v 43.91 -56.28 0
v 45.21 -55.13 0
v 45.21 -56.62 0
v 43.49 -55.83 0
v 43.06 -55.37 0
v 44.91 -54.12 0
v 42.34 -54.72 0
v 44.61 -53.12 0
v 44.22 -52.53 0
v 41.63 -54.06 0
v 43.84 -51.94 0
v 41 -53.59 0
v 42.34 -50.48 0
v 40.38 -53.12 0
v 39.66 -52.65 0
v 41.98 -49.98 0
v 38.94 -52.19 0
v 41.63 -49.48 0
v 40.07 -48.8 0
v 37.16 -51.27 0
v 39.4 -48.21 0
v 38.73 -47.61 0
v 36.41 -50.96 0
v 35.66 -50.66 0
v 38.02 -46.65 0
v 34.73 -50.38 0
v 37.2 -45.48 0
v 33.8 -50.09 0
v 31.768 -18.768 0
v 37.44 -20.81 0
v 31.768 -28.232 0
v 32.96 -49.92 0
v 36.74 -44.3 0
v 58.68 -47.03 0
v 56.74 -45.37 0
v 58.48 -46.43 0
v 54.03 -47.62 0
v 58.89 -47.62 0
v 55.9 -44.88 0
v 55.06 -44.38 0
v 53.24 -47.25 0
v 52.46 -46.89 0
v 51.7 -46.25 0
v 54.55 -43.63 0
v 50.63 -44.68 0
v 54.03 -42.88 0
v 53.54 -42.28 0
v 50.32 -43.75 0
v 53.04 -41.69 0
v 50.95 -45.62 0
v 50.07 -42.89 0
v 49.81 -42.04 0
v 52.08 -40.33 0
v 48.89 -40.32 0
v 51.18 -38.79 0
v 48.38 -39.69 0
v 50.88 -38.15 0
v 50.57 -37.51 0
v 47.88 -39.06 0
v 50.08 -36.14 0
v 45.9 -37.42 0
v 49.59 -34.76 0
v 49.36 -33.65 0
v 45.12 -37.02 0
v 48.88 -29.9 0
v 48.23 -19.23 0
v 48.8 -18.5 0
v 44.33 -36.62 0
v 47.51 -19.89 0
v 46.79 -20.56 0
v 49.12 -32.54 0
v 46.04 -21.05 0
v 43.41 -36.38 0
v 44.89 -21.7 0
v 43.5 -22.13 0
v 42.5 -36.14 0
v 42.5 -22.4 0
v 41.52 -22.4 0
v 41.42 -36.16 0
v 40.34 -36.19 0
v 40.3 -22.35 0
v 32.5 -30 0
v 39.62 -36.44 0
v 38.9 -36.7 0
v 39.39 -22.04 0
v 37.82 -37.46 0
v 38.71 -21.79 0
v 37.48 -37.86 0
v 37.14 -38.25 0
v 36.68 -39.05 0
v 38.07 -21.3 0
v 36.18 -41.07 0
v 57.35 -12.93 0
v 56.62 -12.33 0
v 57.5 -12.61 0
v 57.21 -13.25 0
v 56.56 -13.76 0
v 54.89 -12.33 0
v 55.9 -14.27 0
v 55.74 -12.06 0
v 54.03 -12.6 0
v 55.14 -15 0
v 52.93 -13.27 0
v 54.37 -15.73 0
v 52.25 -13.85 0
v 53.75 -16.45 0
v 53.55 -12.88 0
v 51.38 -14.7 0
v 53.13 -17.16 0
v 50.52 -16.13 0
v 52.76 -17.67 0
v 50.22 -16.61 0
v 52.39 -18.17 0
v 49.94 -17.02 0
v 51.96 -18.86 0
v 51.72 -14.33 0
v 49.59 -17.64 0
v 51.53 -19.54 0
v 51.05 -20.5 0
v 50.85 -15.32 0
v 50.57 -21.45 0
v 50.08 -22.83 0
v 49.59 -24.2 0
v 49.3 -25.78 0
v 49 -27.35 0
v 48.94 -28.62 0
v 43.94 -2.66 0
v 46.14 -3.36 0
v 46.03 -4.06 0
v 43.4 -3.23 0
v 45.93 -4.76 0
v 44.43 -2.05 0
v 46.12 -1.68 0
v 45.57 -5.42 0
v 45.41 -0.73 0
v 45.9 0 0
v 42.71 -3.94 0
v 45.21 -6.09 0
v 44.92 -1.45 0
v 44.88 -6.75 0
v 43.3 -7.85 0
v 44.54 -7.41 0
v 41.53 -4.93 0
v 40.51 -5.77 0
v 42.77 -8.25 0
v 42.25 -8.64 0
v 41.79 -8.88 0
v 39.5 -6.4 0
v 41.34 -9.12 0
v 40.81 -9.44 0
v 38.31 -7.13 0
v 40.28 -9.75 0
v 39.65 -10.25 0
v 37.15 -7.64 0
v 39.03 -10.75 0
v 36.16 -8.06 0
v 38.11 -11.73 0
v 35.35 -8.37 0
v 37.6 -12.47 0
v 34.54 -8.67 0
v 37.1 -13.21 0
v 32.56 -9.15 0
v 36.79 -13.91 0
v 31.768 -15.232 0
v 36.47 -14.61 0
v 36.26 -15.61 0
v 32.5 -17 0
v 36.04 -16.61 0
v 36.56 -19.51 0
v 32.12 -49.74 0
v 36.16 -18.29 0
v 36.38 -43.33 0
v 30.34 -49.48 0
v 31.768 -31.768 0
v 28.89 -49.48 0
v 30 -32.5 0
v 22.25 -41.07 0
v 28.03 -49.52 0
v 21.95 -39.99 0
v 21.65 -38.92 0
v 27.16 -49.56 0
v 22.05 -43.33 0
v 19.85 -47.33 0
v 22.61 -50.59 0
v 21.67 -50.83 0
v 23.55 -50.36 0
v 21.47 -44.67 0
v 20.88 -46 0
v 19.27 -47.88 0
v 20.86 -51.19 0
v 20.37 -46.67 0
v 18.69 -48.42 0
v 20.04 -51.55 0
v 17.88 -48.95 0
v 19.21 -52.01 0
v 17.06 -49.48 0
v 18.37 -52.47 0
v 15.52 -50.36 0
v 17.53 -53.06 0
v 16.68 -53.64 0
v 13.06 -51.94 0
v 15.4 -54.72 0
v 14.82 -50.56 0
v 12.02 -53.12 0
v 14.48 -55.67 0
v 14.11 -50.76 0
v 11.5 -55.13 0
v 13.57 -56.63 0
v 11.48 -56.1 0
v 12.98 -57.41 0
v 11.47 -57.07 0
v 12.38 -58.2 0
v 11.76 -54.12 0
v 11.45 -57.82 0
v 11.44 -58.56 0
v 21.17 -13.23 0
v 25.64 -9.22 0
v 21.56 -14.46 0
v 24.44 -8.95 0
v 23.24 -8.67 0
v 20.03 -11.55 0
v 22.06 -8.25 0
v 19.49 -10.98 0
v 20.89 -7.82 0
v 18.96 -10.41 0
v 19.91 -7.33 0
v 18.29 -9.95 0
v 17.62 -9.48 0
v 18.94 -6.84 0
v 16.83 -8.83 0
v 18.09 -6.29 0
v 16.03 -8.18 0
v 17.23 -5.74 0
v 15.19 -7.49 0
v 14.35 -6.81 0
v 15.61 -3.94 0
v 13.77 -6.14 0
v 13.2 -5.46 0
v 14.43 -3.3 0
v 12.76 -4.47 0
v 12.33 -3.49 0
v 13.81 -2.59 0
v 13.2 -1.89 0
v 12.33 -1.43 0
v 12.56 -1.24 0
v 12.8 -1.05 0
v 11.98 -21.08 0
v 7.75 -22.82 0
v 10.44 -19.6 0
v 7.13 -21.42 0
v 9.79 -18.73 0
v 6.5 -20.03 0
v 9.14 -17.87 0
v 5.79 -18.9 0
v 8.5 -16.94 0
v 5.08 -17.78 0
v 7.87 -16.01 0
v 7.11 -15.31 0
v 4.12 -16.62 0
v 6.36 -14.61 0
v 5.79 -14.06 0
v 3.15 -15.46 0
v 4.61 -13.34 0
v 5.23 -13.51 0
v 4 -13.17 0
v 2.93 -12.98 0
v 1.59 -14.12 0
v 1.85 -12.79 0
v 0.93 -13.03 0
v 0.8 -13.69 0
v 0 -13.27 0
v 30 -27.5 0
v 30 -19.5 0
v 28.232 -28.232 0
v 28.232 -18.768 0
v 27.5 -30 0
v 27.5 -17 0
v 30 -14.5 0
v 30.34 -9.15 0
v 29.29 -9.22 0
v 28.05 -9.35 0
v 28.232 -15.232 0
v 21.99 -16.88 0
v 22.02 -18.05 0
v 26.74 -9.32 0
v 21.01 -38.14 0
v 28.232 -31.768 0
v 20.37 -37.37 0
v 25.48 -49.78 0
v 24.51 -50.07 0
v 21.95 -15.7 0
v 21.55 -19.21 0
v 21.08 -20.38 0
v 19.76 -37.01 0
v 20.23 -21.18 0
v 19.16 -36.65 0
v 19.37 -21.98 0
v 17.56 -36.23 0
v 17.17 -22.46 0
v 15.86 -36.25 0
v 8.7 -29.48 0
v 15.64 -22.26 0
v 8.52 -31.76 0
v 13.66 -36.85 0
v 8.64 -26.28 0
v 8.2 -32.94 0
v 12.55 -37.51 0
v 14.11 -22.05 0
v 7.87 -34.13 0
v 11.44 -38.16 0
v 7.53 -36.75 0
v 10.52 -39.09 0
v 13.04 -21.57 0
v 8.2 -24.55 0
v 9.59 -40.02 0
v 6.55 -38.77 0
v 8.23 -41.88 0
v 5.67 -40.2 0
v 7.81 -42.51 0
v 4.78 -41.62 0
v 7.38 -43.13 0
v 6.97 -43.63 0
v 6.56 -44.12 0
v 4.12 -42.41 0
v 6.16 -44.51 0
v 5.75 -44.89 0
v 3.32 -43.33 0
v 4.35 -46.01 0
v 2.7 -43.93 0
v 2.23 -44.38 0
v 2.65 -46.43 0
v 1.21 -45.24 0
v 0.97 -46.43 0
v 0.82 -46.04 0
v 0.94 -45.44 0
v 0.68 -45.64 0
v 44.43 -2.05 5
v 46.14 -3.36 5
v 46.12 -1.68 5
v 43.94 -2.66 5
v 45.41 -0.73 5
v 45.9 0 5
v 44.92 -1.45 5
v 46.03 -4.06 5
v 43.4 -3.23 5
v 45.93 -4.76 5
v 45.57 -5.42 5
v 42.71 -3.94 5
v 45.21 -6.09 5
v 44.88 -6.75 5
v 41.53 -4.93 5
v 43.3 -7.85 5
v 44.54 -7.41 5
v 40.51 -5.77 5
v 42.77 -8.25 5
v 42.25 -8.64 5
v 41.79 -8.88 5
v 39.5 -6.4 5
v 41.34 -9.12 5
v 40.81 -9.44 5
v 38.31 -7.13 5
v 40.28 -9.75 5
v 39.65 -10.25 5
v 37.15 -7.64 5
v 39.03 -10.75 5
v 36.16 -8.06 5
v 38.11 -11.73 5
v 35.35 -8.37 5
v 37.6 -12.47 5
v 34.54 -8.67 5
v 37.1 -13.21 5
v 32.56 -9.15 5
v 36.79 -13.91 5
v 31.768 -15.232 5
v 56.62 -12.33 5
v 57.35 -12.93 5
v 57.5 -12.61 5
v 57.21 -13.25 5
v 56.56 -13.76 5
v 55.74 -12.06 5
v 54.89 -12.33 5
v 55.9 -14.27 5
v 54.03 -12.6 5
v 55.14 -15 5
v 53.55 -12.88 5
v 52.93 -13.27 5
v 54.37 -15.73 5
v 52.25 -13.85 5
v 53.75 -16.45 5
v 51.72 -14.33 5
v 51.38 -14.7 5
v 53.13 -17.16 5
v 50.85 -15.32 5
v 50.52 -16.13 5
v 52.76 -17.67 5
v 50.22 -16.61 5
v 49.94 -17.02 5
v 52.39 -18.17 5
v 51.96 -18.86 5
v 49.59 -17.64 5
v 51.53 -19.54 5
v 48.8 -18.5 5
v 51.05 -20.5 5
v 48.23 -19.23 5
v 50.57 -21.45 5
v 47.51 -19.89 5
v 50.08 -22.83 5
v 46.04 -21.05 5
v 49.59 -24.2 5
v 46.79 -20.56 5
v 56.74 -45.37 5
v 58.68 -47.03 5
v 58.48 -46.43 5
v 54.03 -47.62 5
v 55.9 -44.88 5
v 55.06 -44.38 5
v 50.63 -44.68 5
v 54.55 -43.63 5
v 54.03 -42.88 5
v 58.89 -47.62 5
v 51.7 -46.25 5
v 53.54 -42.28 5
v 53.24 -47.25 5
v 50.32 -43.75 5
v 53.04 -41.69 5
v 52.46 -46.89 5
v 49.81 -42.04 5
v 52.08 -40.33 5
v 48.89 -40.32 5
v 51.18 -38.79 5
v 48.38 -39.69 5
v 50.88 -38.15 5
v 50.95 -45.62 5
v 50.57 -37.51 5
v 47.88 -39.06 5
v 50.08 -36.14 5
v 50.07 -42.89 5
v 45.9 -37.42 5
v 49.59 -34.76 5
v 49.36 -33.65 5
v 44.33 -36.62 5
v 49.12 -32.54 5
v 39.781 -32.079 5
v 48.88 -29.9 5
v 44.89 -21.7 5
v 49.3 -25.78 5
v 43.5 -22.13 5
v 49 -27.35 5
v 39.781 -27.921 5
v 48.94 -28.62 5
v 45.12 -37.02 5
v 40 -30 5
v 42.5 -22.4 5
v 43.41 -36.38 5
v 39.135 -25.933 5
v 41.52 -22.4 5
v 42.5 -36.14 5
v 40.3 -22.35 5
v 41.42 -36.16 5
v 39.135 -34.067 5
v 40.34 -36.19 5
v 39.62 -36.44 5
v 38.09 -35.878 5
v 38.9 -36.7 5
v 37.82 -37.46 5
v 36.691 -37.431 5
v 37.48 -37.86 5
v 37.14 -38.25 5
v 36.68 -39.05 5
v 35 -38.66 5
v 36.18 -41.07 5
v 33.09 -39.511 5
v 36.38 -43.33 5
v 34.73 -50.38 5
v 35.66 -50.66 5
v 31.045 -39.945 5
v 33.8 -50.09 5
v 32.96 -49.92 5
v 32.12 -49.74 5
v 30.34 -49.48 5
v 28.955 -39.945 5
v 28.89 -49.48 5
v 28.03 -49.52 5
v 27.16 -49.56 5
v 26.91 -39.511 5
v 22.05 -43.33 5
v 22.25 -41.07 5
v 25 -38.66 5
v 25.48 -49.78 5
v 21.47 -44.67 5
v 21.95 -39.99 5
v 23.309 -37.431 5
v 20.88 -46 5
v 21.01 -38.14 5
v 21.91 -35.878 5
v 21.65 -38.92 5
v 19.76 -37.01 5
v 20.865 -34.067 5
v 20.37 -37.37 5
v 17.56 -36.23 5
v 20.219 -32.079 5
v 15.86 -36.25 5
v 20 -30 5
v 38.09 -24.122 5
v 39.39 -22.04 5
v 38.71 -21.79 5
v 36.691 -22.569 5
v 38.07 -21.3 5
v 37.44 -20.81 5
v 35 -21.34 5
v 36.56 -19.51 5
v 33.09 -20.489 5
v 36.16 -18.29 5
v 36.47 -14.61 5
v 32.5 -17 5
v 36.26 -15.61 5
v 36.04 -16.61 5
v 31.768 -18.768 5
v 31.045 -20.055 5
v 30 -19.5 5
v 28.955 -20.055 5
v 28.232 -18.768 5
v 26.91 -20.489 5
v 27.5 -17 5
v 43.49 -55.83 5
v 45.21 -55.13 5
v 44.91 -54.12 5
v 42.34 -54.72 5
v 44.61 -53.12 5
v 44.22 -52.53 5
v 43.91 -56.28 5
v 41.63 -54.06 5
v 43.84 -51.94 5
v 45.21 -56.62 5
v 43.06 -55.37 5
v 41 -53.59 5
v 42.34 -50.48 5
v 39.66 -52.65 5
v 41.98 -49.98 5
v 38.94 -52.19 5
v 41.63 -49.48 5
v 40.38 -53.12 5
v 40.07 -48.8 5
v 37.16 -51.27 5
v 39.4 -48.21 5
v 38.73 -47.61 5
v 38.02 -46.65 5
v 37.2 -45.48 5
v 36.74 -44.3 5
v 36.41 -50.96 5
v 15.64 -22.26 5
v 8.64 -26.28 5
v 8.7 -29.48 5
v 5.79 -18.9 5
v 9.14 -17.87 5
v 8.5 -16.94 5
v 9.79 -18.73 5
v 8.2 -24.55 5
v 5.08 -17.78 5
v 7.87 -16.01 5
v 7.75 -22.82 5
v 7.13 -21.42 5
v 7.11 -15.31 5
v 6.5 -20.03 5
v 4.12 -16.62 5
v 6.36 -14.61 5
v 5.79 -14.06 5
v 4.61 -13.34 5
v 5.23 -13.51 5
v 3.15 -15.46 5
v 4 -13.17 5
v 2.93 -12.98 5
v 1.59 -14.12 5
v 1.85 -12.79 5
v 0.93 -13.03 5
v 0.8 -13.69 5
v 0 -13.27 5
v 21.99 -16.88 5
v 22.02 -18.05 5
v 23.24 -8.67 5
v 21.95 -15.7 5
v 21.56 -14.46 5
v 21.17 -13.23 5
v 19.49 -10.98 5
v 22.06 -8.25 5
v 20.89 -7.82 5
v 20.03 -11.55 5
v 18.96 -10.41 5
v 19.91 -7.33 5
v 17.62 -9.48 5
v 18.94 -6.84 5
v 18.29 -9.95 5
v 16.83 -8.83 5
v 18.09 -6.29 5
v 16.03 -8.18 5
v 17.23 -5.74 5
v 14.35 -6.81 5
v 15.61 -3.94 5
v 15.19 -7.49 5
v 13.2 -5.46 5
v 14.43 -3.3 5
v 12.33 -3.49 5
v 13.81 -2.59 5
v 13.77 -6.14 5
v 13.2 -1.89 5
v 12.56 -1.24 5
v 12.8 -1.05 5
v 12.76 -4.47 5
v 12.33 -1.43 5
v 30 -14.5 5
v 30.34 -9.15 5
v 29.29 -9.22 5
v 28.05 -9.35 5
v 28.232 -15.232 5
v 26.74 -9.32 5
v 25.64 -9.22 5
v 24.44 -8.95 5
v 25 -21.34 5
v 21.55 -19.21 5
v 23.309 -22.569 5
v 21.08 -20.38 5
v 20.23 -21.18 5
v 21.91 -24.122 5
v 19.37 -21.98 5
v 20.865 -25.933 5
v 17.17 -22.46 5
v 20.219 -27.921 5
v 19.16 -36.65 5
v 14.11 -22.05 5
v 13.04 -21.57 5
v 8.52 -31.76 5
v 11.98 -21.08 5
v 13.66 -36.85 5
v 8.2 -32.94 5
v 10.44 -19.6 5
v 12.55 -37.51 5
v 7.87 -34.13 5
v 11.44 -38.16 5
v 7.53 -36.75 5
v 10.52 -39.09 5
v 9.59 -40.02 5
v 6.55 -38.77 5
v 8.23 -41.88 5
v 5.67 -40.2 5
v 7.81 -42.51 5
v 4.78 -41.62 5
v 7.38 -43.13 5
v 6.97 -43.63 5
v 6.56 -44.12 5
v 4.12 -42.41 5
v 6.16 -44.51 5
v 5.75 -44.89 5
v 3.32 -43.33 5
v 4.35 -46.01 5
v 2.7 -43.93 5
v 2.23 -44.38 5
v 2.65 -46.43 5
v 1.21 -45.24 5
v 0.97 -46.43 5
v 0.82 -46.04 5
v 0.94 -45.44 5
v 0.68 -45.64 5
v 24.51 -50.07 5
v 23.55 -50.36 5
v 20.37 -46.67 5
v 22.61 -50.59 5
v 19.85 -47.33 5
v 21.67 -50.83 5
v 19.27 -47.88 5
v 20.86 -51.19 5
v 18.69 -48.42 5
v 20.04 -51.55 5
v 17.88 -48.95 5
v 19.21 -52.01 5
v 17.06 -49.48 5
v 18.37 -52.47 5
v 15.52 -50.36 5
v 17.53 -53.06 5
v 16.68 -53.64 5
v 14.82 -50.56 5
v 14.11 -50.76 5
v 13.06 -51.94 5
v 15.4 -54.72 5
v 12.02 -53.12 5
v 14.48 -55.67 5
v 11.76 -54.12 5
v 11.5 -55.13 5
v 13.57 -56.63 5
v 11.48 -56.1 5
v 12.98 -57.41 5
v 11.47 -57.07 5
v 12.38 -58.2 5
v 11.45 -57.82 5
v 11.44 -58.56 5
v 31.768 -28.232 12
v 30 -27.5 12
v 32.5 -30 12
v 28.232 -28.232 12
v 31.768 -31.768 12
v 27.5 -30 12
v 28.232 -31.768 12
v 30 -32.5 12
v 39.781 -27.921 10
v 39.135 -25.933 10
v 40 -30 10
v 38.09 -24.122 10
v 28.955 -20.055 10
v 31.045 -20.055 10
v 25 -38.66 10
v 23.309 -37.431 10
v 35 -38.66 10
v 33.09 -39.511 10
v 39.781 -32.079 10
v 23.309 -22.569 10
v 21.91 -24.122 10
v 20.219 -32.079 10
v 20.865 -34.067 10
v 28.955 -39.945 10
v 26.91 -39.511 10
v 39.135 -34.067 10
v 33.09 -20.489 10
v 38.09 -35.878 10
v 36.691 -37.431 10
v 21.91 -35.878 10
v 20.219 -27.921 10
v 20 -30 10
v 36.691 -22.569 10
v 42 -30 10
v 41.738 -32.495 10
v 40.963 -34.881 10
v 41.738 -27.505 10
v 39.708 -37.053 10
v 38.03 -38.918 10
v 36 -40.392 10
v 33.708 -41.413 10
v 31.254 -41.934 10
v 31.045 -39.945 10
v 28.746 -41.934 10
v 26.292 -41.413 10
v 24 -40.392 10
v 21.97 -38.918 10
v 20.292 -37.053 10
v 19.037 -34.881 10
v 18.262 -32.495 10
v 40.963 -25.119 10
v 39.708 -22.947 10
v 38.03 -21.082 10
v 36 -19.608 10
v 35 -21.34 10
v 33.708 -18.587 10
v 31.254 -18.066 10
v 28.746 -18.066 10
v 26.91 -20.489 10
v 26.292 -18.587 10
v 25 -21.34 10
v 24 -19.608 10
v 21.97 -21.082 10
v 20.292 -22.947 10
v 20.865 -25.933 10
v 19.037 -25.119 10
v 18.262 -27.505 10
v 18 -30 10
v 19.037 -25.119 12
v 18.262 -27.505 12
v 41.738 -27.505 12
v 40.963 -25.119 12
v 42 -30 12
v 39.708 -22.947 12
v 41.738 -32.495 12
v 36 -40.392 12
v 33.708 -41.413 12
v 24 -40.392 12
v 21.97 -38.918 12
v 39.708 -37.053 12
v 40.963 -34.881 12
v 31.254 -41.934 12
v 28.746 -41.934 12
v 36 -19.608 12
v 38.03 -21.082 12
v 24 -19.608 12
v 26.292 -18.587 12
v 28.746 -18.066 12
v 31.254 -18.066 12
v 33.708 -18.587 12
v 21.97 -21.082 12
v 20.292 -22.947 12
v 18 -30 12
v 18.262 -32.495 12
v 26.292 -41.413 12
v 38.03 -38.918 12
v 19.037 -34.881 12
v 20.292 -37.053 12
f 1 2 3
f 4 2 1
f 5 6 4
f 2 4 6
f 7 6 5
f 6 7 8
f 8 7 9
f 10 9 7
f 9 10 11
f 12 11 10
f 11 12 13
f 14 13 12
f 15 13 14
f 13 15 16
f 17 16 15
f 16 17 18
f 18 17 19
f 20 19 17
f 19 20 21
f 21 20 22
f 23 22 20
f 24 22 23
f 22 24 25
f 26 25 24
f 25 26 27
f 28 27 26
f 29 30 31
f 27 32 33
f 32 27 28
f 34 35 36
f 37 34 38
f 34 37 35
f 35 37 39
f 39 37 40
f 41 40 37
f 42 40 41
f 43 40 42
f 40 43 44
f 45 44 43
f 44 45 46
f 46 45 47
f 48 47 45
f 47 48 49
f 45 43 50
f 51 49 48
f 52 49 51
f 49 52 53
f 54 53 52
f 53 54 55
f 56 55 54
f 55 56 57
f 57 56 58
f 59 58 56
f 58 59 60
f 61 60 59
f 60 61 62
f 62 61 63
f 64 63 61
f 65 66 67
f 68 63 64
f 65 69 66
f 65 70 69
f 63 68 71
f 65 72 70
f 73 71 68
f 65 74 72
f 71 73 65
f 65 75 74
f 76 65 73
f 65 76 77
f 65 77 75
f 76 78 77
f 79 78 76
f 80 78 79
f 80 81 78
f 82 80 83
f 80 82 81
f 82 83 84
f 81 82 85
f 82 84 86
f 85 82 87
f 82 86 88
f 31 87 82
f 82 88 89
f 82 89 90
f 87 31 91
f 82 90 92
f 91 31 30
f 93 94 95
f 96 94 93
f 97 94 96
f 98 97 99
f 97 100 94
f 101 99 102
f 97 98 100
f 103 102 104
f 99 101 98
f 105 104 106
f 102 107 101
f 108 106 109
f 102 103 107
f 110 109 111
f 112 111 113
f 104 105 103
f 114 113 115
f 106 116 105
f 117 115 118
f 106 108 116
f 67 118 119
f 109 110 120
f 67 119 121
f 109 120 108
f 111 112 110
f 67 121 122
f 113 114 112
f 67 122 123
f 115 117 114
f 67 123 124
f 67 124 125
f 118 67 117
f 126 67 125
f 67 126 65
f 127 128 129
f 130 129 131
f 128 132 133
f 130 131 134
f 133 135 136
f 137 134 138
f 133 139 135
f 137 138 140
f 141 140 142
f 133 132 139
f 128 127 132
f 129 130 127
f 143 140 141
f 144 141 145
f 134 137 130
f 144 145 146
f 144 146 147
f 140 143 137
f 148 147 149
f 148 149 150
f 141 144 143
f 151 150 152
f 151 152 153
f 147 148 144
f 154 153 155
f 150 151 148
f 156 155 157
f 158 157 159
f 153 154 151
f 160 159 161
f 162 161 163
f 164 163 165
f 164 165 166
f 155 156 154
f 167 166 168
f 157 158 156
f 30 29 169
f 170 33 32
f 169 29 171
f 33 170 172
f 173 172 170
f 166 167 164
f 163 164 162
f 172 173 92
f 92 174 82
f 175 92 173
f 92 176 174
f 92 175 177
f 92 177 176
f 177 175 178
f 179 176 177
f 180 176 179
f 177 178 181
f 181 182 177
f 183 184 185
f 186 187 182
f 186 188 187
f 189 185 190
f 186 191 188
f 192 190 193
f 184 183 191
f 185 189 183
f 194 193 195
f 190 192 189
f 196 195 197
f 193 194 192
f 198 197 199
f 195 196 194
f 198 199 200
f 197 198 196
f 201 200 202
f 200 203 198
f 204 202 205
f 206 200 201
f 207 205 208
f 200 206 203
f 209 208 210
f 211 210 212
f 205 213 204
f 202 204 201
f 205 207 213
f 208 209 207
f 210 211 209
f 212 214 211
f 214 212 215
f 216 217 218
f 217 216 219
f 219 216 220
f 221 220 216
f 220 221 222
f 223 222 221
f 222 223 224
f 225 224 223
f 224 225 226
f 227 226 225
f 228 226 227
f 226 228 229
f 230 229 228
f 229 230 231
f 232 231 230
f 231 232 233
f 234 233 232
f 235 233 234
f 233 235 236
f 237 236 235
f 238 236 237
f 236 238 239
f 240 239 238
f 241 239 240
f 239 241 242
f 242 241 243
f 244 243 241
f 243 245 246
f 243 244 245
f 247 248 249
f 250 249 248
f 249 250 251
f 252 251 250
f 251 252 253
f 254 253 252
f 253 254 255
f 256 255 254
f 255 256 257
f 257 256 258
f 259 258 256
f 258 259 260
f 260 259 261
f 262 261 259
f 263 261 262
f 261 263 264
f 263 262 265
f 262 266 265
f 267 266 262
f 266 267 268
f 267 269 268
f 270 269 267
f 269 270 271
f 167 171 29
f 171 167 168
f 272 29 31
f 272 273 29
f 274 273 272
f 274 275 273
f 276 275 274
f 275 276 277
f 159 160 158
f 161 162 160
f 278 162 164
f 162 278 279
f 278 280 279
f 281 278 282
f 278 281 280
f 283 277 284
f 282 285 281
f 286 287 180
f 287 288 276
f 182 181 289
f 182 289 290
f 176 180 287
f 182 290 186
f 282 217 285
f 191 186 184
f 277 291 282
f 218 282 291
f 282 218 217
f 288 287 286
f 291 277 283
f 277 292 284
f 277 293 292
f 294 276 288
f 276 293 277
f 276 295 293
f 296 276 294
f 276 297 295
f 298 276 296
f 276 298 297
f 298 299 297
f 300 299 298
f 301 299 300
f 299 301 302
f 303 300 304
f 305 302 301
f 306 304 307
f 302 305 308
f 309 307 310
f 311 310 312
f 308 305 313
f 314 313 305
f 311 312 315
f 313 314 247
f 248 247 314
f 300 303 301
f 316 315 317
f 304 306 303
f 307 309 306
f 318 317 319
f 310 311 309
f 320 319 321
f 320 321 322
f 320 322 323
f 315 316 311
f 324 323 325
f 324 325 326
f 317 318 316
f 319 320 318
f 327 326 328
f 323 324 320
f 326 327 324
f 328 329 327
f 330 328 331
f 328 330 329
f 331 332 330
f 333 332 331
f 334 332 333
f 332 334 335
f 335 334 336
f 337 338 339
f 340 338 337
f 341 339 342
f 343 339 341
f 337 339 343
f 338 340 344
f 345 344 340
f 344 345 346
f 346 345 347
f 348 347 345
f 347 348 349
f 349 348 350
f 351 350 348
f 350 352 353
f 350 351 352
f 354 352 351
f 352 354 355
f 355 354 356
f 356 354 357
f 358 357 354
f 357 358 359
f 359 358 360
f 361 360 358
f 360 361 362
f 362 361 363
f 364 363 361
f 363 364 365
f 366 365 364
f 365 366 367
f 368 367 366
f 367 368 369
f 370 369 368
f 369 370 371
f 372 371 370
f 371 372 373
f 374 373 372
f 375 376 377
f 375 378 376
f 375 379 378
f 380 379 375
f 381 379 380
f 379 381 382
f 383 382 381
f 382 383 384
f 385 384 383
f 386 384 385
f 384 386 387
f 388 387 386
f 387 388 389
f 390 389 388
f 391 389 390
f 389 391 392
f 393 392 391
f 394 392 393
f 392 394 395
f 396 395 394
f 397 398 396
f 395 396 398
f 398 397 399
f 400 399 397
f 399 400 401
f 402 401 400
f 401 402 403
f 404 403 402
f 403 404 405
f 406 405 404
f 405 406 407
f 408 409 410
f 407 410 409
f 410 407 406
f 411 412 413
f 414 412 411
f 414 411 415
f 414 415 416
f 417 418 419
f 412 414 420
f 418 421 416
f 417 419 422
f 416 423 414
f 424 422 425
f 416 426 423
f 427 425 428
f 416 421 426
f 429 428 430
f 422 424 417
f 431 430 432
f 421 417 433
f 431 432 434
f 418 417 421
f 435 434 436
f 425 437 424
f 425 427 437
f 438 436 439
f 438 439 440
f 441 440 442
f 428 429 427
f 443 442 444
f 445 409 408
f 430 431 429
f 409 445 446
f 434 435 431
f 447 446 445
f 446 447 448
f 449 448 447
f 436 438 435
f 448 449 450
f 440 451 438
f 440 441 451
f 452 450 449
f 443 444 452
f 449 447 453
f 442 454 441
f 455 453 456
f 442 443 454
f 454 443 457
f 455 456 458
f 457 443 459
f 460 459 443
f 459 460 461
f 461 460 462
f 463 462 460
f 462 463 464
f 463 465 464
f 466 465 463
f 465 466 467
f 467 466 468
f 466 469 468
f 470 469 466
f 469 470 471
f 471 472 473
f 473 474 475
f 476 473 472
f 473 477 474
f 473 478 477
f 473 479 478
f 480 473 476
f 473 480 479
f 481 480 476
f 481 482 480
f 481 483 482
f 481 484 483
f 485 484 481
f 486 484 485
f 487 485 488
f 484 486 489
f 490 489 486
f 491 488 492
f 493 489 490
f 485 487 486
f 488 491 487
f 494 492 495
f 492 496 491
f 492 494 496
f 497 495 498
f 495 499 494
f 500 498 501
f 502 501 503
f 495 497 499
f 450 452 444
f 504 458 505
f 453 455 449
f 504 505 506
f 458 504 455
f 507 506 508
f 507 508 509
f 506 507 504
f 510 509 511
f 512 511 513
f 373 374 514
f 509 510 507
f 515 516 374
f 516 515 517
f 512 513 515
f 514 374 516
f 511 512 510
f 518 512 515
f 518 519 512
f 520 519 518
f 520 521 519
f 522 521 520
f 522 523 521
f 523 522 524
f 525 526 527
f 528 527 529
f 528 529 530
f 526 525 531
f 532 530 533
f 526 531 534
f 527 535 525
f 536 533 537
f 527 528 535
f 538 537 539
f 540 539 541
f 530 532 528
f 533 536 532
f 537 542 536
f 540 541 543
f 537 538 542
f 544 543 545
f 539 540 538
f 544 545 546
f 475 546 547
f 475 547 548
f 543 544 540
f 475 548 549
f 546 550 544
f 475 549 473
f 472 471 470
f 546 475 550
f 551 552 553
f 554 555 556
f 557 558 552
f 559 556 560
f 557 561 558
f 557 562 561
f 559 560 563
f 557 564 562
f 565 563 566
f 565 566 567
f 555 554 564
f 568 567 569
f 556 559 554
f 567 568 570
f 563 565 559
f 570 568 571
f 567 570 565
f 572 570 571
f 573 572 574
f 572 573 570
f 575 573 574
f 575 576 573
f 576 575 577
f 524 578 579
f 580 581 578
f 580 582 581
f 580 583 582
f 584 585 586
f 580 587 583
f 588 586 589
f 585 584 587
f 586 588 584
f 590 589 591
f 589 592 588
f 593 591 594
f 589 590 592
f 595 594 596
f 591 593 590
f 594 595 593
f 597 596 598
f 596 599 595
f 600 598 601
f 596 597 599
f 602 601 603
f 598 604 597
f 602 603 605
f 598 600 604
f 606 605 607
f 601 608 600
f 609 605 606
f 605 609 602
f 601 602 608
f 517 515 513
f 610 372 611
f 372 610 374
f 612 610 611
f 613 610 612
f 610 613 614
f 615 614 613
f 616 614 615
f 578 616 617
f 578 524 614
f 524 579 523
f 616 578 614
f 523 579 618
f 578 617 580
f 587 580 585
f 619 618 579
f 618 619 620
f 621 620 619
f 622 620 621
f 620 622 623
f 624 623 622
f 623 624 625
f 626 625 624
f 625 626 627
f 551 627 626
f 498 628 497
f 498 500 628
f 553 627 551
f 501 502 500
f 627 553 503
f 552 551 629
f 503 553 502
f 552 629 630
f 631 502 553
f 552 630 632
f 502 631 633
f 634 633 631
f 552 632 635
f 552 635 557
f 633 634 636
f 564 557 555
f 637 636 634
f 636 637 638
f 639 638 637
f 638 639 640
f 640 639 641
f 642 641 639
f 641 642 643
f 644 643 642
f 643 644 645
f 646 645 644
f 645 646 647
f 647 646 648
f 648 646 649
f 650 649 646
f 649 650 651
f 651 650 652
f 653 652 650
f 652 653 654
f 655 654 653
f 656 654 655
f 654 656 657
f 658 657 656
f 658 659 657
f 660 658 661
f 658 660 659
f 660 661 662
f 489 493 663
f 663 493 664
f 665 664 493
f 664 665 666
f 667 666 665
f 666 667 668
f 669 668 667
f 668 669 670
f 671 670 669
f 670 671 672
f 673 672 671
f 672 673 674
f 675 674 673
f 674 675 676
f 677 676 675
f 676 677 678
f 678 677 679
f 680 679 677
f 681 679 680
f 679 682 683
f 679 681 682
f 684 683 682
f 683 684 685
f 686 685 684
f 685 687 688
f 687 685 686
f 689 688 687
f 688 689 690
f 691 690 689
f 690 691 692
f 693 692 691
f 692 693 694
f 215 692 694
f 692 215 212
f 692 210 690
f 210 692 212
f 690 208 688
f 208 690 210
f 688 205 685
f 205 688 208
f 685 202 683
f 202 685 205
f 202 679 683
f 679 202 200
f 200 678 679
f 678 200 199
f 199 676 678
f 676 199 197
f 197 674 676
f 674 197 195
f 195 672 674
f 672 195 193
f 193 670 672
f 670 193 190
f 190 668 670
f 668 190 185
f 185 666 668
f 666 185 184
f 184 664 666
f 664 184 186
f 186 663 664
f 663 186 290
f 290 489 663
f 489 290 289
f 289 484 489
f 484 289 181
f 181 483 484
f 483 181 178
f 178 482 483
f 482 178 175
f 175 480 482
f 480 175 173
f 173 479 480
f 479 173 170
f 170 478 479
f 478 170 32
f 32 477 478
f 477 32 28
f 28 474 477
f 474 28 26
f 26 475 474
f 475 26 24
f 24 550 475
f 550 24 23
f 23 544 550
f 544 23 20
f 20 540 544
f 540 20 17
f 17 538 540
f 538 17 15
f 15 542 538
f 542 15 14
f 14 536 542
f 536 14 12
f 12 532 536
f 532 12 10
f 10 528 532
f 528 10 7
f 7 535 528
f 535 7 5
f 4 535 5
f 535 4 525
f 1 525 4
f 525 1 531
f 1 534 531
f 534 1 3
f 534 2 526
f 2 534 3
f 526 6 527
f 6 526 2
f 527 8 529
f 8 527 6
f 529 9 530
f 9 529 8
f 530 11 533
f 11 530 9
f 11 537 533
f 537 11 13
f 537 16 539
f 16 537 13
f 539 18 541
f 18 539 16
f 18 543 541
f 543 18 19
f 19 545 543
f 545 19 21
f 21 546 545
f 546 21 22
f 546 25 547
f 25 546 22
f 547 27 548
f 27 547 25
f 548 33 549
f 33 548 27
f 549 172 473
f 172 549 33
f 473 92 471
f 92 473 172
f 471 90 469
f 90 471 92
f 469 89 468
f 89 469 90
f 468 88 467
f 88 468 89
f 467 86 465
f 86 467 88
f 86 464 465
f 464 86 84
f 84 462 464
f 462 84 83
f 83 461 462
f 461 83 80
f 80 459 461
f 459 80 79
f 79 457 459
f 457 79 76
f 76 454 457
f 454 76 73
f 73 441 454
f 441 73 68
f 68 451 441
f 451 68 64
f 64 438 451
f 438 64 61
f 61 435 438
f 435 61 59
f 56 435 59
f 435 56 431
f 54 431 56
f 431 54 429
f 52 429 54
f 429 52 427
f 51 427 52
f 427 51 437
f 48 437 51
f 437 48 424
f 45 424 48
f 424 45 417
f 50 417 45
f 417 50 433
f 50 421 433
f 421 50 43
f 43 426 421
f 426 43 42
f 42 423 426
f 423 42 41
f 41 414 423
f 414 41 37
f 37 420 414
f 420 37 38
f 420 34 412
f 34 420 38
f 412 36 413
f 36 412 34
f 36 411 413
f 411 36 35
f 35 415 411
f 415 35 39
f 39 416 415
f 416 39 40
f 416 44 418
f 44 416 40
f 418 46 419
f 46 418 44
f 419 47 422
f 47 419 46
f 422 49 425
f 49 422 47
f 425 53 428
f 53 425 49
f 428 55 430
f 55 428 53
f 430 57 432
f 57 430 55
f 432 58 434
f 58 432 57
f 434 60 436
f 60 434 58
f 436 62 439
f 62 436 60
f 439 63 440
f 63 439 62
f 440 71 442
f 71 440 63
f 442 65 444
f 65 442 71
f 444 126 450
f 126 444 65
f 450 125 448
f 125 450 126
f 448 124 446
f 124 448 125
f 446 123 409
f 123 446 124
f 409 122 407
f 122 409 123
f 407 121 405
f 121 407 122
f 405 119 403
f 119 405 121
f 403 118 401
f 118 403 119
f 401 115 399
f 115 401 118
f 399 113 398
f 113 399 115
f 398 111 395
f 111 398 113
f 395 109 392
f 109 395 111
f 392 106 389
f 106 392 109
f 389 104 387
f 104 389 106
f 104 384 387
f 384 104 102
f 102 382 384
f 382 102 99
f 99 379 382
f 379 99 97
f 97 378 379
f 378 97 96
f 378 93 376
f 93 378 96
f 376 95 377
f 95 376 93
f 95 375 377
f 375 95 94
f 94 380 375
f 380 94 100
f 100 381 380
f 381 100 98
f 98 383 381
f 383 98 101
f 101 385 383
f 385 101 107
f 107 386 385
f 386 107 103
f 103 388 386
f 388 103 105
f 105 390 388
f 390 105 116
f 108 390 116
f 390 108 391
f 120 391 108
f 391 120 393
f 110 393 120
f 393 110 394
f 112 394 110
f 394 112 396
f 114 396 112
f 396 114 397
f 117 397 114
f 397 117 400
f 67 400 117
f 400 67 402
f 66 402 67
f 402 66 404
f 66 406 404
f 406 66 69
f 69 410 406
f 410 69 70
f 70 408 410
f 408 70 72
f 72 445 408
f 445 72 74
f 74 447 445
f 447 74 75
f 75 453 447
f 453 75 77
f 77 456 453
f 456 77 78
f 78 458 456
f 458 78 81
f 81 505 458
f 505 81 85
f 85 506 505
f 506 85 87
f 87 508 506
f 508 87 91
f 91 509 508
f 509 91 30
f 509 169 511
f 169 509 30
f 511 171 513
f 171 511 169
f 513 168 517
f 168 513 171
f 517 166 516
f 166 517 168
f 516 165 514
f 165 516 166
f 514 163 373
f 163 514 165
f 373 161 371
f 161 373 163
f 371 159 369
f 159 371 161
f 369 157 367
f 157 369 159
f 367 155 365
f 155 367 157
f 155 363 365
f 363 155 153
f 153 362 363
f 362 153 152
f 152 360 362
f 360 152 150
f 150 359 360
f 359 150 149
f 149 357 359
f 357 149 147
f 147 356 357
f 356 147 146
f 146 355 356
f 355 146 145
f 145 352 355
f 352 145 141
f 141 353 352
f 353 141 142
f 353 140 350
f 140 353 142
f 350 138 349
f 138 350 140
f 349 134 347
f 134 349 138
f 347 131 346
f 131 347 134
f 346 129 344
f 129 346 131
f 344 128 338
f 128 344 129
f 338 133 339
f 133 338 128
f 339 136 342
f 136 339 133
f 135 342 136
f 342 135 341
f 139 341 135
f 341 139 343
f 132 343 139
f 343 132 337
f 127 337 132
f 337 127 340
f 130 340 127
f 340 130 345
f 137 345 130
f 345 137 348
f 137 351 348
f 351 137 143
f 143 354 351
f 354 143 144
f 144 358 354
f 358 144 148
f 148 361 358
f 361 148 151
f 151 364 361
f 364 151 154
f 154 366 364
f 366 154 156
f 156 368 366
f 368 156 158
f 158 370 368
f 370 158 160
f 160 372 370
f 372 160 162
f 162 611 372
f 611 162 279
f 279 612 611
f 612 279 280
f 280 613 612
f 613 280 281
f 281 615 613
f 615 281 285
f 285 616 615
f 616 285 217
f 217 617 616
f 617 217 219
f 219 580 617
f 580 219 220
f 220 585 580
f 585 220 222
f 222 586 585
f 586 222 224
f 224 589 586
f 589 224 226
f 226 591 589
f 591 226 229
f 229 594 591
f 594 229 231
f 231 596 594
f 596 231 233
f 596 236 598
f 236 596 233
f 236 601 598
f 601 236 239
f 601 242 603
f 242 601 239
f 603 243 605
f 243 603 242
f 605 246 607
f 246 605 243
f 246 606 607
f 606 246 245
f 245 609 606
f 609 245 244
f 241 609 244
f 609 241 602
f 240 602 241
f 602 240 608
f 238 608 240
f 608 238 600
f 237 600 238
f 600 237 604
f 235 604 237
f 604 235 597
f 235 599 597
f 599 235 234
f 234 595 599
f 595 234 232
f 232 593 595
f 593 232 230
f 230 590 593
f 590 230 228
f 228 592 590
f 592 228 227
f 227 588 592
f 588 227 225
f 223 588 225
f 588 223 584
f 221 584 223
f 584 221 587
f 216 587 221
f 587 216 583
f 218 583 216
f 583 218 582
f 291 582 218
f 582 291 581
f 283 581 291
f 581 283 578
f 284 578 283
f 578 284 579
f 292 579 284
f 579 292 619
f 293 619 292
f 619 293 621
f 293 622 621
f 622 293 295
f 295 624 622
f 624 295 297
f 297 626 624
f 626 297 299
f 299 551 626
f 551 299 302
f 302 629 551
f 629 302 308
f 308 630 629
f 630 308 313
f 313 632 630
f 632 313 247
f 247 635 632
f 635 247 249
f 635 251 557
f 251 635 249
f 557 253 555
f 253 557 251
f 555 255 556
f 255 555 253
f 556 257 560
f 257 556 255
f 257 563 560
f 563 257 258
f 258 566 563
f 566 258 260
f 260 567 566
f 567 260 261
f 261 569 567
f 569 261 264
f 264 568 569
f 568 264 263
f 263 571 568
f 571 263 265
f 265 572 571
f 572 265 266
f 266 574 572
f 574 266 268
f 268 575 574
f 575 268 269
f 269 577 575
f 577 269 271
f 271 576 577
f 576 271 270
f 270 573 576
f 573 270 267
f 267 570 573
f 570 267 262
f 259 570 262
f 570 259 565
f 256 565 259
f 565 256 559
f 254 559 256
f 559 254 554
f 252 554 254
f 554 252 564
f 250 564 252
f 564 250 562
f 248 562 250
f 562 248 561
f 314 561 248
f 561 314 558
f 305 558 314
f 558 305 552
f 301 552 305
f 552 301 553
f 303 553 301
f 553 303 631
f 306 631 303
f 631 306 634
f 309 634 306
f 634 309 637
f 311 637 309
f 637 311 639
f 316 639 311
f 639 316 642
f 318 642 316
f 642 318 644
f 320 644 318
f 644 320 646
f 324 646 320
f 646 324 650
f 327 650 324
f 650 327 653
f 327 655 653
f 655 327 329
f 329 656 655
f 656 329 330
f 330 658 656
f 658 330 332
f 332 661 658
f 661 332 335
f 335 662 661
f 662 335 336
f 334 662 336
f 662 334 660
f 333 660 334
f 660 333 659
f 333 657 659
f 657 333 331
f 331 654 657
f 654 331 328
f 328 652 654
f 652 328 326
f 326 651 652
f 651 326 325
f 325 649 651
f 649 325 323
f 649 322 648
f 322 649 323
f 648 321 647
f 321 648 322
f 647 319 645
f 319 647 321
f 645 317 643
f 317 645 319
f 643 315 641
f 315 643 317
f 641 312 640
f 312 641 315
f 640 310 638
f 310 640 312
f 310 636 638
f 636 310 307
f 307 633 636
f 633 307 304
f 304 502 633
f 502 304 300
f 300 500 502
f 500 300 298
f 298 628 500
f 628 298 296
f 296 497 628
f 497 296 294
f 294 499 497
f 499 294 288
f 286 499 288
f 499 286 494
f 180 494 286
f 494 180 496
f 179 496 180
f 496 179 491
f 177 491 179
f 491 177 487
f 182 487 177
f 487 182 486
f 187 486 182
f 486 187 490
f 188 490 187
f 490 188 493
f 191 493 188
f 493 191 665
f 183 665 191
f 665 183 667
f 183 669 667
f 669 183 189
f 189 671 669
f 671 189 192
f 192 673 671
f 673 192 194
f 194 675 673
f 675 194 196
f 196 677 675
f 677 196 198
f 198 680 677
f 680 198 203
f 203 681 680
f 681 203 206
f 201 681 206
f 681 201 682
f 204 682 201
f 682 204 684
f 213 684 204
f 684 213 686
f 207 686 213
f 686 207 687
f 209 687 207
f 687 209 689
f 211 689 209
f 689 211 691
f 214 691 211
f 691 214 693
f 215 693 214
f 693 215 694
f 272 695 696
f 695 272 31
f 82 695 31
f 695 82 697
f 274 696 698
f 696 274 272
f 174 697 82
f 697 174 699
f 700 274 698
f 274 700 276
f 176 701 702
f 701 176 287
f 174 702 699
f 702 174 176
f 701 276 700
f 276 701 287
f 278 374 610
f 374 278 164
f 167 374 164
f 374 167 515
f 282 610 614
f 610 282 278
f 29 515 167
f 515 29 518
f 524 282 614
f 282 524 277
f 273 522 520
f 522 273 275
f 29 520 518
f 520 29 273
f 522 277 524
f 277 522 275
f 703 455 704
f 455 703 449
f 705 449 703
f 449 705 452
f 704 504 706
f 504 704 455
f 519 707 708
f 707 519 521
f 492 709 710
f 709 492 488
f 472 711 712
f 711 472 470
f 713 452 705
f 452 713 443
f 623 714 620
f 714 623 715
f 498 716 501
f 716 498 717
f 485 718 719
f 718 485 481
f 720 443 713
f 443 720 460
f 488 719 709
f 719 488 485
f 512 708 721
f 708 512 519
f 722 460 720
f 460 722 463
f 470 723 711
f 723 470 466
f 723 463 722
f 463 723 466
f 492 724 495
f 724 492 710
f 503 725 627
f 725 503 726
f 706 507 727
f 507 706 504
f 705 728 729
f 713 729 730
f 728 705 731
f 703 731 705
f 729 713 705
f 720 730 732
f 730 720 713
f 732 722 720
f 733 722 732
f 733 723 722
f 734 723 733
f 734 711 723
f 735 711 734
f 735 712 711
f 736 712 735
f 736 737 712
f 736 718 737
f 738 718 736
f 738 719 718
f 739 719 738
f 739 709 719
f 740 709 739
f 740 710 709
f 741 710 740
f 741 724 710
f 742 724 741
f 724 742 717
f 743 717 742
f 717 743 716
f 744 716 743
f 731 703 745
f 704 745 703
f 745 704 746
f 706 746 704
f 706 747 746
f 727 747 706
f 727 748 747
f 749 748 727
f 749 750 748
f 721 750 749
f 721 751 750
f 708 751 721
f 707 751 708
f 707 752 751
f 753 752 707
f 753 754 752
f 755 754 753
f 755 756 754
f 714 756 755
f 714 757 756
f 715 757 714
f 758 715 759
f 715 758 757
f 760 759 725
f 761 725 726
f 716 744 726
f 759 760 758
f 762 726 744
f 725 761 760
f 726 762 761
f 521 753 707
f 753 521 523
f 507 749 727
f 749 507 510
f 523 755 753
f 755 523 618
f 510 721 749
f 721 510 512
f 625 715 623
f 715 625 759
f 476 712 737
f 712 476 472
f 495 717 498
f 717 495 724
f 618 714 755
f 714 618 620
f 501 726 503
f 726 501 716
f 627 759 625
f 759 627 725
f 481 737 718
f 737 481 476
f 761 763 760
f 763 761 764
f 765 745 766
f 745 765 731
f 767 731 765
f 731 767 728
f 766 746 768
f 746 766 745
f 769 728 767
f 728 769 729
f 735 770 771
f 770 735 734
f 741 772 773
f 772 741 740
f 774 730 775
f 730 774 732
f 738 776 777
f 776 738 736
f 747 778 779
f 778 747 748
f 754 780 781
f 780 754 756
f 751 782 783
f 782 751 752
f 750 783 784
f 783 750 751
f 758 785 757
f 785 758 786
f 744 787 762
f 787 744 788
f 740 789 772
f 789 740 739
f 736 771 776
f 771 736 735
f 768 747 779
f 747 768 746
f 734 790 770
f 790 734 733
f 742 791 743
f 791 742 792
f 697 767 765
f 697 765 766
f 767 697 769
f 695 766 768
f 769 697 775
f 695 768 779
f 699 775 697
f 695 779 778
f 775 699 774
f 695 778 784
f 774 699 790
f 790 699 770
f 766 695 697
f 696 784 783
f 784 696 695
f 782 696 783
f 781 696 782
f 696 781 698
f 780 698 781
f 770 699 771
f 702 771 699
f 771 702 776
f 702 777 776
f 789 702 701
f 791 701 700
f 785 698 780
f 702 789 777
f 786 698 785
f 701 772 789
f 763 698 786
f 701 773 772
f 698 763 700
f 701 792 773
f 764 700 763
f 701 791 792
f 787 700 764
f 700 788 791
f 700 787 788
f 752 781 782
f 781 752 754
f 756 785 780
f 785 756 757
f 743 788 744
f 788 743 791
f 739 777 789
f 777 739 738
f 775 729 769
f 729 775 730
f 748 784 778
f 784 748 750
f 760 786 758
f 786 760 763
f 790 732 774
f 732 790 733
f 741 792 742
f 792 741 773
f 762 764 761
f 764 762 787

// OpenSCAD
difference(){

linear_extrude(height = 5, center = false) {

polygon(points=[[45.9,0],[45.41,-0.73],[44.92,-1.45],[44.43,-2.05],[43.94,-2.66],[43.4,-3.23],[42.71,-3.94],[41.53,-4.93],[40.51,-5.77],[39.5,-6.4],[38.31,-7.13],[37.15,-7.64],[36.16,-8.06],[35.35,-8.37],[34.54,-8.67],[33.55,-8.91],[32.56,-9.15],[31.45,-9.15],[30.34,-9.15],[29.29,-9.22],[28.05,-9.35],[26.74,-9.32],[25.64,-9.22],[24.44,-8.95],[23.24,-8.67],[22.06,-8.25],[20.89,-7.82],[19.91,-7.33],[18.94,-6.84],[18.09,-6.29],[17.23,-5.74],[16.42,-4.84],[15.61,-3.94],[15.02,-3.62],[14.43,-3.3],[13.81,-2.59],[13.2,-1.89],[13,-1.47],[12.8,-1.05],[12.56,-1.24],[12.33,-1.43],[12.33,-2.46],[12.33,-3.49],[12.76,-4.47],[13.2,-5.46],[13.77,-6.14],[14.35,-6.81],[15.19,-7.49],[16.03,-8.18],[16.83,-8.83],[17.62,-9.48],[18.29,-9.95],[18.96,-10.41],[19.49,-10.98],[20.03,-11.55],[20.6,-12.39],[21.17,-13.23],[21.56,-14.46],[21.95,-15.7],[21.99,-16.88],[22.02,-18.05],[21.55,-19.21],[21.08,-20.38],[20.23,-21.18],[19.37,-21.98],[18.27,-22.22],[17.17,-22.46],[15.64,-22.26],[14.11,-22.05],[13.04,-21.57],[11.98,-21.08],[11.21,-20.34],[10.44,-19.6],[9.79,-18.73],[9.14,-17.87],[8.5,-16.94],[7.87,-16.01],[7.11,-15.31],[6.36,-14.61],[5.79,-14.06],[5.23,-13.51],[4.61,-13.34],[4,-13.17],[2.93,-12.98],[1.85,-12.79],[0.93,-13.03],[0,-13.27],[0.8,-13.69],[1.59,-14.12],[2.37,-14.79],[3.15,-15.46],[4.12,-16.62],[5.08,-17.78],[5.79,-18.9],[6.5,-20.03],[7.13,-21.42],[7.75,-22.82],[8.2,-24.55],[8.64,-26.28],[8.67,-27.88],[8.7,-29.48],[8.61,-30.62],[8.52,-31.76],[8.2,-32.94],[7.87,-34.13],[7.7,-35.44],[7.53,-36.75],[7.04,-37.76],[6.55,-38.77],[5.67,-40.2],[4.78,-41.62],[4.12,-42.41],[3.32,-43.33],[2.7,-43.93],[2.23,-44.38],[1.72,-44.81],[1.21,-45.24],[0.94,-45.44],[0.68,-45.64],[0.82,-46.04],[0.97,-46.43],[1.81,-46.43],[2.65,-46.43],[3.5,-46.22],[4.35,-46.01],[5.05,-45.45],[5.75,-44.89],[6.16,-44.51],[6.56,-44.12],[6.97,-43.63],[7.38,-43.13],[7.81,-42.51],[8.23,-41.88],[8.91,-40.95],[9.59,-40.02],[10.52,-39.09],[11.44,-38.16],[12.55,-37.51],[13.66,-36.85],[14.76,-36.55],[15.86,-36.25],[16.71,-36.24],[17.56,-36.23],[18.36,-36.44],[19.16,-36.65],[19.76,-37.01],[20.37,-37.37],[21.01,-38.14],[21.65,-38.92],[21.95,-39.99],[22.25,-41.07],[22.15,-42.2],[22.05,-43.33],[21.47,-44.67],[20.88,-46],[20.37,-46.67],[19.85,-47.33],[19.27,-47.88],[18.69,-48.42],[17.88,-48.95],[17.06,-49.48],[16.29,-49.92],[15.52,-50.36],[14.82,-50.56],[14.11,-50.76],[13.06,-51.94],[12.02,-53.12],[11.76,-54.12],[11.5,-55.13],[11.48,-56.1],[11.47,-57.07],[11.45,-57.82],[11.44,-58.56],[11.91,-58.38],[12.38,-58.2],[12.98,-57.41],[13.57,-56.63],[14.48,-55.67],[15.4,-54.72],[16.04,-54.18],[16.68,-53.64],[17.53,-53.06],[18.37,-52.47],[19.21,-52.01],[20.04,-51.55],[20.86,-51.19],[21.67,-50.83],[22.61,-50.59],[23.55,-50.36],[24.51,-50.07],[25.48,-49.78],[26.32,-49.67],[27.16,-49.56],[28.03,-49.52],[28.89,-49.48],[29.61,-49.48],[30.34,-49.48],[31.23,-49.61],[32.12,-49.74],[32.96,-49.92],[33.8,-50.09],[34.73,-50.38],[35.66,-50.66],[36.41,-50.96],[37.16,-51.27],[38.05,-51.73],[38.94,-52.19],[39.66,-52.65],[40.38,-53.12],[41,-53.59],[41.63,-54.06],[42.34,-54.72],[43.06,-55.37],[43.49,-55.83],[43.91,-56.28],[44.56,-56.45],[45.21,-56.62],[45.21,-55.87],[45.21,-55.13],[44.91,-54.12],[44.61,-53.12],[44.22,-52.53],[43.84,-51.94],[43.09,-51.21],[42.34,-50.48],[41.98,-49.98],[41.63,-49.48],[40.85,-49.14],[40.07,-48.8],[39.4,-48.21],[38.73,-47.61],[38.02,-46.65],[37.2,-45.48],[36.74,-44.3],[36.38,-43.33],[36.28,-42.2],[36.18,-41.07],[36.43,-40.06],[36.68,-39.05],[36.91,-38.65],[37.14,-38.25],[37.48,-37.86],[37.82,-37.46],[38.36,-37.08],[38.9,-36.7],[39.62,-36.44],[40.34,-36.19],[41.42,-36.16],[42.5,-36.14],[43.41,-36.38],[44.33,-36.62],[45.12,-37.02],[45.9,-37.42],[46.89,-38.24],[47.88,-39.06],[48.38,-39.69],[48.89,-40.32],[49.35,-41.18],[49.81,-42.04],[50.07,-42.89],[50.32,-43.75],[50.63,-44.68],[50.95,-45.62],[51.7,-46.25],[52.46,-46.89],[53.24,-47.25],[54.03,-47.62],[54.93,-47.62],[55.83,-47.62],[56.66,-47.62],[57.5,-47.62],[58.2,-47.62],[58.89,-47.62],[58.68,-47.03],[58.48,-46.43],[57.61,-45.9],[56.74,-45.37],[55.9,-44.88],[55.06,-44.38],[54.55,-43.63],[54.03,-42.88],[53.54,-42.28],[53.04,-41.69],[52.56,-41.01],[52.08,-40.33],[51.63,-39.56],[51.18,-38.79],[50.88,-38.15],[50.57,-37.51],[50.08,-36.14],[49.59,-34.76],[49.36,-33.65],[49.12,-32.54],[49,-31.22],[48.88,-29.9],[48.94,-28.62],[49,-27.35],[49.3,-25.78],[49.59,-24.2],[50.08,-22.83],[50.57,-21.45],[51.05,-20.5],[51.53,-19.54],[51.96,-18.86],[52.39,-18.17],[52.76,-17.67],[53.13,-17.16],[53.75,-16.45],[54.37,-15.73],[55.14,-15],[55.9,-14.27],[56.56,-13.76],[57.21,-13.25],[57.35,-12.93],[57.5,-12.61],[56.62,-12.33],[55.74,-12.06],[54.89,-12.33],[54.03,-12.6],[53.55,-12.88],[52.93,-13.27],[52.25,-13.85],[51.72,-14.33],[51.38,-14.7],[50.85,-15.32],[50.52,-16.13],[50.22,-16.61],[49.94,-17.02],[49.59,-17.64],[48.8,-18.5],[48.23,-19.23],[47.51,-19.89],[46.79,-20.56],[46.04,-21.05],[44.89,-21.7],[43.5,-22.13],[42.5,-22.4],[41.52,-22.4],[40.3,-22.35],[39.39,-22.04],[38.71,-21.79],[38.07,-21.3],[37.44,-20.81],[37,-20.16],[36.56,-19.51],[36.36,-18.9],[36.16,-18.29],[36.1,-17.45],[36.04,-16.61],[36.26,-15.61],[36.47,-14.61],[36.79,-13.91],[37.1,-13.21],[37.6,-12.47],[38.11,-11.73],[38.57,-11.24],[39.03,-10.75],[39.65,-10.25],[40.28,-9.75],[40.81,-9.44],[41.34,-9.12],[41.79,-8.88],[42.25,-8.64],[42.77,-8.25],[43.3,-7.85],[43.92,-7.63],[44.54,-7.41],[44.88,-6.75],[45.21,-6.09],[45.57,-5.42],[45.93,-4.76],[46.03,-4.06],[46.14,-3.36],[46.13,-2.52],[46.12,-1.68],[46.01,-0.84]]);

}

translate([30,-30,-2]) cylinder(h=8, r=2.5);
translate([30,-17,-2]) cylinder(h=8, r=2.5);
}

difference(){
	translate([30,-30,5]) cylinder(h=5,r=10);

	translate([30,-30,3]) cylinder(h=10,r=2.5);
}

difference(){
	translate([30,-30,10]) cylinder(h=2,r=12);

	translate([30,-30,7]) cylinder(h=14, r=2.5);
}
